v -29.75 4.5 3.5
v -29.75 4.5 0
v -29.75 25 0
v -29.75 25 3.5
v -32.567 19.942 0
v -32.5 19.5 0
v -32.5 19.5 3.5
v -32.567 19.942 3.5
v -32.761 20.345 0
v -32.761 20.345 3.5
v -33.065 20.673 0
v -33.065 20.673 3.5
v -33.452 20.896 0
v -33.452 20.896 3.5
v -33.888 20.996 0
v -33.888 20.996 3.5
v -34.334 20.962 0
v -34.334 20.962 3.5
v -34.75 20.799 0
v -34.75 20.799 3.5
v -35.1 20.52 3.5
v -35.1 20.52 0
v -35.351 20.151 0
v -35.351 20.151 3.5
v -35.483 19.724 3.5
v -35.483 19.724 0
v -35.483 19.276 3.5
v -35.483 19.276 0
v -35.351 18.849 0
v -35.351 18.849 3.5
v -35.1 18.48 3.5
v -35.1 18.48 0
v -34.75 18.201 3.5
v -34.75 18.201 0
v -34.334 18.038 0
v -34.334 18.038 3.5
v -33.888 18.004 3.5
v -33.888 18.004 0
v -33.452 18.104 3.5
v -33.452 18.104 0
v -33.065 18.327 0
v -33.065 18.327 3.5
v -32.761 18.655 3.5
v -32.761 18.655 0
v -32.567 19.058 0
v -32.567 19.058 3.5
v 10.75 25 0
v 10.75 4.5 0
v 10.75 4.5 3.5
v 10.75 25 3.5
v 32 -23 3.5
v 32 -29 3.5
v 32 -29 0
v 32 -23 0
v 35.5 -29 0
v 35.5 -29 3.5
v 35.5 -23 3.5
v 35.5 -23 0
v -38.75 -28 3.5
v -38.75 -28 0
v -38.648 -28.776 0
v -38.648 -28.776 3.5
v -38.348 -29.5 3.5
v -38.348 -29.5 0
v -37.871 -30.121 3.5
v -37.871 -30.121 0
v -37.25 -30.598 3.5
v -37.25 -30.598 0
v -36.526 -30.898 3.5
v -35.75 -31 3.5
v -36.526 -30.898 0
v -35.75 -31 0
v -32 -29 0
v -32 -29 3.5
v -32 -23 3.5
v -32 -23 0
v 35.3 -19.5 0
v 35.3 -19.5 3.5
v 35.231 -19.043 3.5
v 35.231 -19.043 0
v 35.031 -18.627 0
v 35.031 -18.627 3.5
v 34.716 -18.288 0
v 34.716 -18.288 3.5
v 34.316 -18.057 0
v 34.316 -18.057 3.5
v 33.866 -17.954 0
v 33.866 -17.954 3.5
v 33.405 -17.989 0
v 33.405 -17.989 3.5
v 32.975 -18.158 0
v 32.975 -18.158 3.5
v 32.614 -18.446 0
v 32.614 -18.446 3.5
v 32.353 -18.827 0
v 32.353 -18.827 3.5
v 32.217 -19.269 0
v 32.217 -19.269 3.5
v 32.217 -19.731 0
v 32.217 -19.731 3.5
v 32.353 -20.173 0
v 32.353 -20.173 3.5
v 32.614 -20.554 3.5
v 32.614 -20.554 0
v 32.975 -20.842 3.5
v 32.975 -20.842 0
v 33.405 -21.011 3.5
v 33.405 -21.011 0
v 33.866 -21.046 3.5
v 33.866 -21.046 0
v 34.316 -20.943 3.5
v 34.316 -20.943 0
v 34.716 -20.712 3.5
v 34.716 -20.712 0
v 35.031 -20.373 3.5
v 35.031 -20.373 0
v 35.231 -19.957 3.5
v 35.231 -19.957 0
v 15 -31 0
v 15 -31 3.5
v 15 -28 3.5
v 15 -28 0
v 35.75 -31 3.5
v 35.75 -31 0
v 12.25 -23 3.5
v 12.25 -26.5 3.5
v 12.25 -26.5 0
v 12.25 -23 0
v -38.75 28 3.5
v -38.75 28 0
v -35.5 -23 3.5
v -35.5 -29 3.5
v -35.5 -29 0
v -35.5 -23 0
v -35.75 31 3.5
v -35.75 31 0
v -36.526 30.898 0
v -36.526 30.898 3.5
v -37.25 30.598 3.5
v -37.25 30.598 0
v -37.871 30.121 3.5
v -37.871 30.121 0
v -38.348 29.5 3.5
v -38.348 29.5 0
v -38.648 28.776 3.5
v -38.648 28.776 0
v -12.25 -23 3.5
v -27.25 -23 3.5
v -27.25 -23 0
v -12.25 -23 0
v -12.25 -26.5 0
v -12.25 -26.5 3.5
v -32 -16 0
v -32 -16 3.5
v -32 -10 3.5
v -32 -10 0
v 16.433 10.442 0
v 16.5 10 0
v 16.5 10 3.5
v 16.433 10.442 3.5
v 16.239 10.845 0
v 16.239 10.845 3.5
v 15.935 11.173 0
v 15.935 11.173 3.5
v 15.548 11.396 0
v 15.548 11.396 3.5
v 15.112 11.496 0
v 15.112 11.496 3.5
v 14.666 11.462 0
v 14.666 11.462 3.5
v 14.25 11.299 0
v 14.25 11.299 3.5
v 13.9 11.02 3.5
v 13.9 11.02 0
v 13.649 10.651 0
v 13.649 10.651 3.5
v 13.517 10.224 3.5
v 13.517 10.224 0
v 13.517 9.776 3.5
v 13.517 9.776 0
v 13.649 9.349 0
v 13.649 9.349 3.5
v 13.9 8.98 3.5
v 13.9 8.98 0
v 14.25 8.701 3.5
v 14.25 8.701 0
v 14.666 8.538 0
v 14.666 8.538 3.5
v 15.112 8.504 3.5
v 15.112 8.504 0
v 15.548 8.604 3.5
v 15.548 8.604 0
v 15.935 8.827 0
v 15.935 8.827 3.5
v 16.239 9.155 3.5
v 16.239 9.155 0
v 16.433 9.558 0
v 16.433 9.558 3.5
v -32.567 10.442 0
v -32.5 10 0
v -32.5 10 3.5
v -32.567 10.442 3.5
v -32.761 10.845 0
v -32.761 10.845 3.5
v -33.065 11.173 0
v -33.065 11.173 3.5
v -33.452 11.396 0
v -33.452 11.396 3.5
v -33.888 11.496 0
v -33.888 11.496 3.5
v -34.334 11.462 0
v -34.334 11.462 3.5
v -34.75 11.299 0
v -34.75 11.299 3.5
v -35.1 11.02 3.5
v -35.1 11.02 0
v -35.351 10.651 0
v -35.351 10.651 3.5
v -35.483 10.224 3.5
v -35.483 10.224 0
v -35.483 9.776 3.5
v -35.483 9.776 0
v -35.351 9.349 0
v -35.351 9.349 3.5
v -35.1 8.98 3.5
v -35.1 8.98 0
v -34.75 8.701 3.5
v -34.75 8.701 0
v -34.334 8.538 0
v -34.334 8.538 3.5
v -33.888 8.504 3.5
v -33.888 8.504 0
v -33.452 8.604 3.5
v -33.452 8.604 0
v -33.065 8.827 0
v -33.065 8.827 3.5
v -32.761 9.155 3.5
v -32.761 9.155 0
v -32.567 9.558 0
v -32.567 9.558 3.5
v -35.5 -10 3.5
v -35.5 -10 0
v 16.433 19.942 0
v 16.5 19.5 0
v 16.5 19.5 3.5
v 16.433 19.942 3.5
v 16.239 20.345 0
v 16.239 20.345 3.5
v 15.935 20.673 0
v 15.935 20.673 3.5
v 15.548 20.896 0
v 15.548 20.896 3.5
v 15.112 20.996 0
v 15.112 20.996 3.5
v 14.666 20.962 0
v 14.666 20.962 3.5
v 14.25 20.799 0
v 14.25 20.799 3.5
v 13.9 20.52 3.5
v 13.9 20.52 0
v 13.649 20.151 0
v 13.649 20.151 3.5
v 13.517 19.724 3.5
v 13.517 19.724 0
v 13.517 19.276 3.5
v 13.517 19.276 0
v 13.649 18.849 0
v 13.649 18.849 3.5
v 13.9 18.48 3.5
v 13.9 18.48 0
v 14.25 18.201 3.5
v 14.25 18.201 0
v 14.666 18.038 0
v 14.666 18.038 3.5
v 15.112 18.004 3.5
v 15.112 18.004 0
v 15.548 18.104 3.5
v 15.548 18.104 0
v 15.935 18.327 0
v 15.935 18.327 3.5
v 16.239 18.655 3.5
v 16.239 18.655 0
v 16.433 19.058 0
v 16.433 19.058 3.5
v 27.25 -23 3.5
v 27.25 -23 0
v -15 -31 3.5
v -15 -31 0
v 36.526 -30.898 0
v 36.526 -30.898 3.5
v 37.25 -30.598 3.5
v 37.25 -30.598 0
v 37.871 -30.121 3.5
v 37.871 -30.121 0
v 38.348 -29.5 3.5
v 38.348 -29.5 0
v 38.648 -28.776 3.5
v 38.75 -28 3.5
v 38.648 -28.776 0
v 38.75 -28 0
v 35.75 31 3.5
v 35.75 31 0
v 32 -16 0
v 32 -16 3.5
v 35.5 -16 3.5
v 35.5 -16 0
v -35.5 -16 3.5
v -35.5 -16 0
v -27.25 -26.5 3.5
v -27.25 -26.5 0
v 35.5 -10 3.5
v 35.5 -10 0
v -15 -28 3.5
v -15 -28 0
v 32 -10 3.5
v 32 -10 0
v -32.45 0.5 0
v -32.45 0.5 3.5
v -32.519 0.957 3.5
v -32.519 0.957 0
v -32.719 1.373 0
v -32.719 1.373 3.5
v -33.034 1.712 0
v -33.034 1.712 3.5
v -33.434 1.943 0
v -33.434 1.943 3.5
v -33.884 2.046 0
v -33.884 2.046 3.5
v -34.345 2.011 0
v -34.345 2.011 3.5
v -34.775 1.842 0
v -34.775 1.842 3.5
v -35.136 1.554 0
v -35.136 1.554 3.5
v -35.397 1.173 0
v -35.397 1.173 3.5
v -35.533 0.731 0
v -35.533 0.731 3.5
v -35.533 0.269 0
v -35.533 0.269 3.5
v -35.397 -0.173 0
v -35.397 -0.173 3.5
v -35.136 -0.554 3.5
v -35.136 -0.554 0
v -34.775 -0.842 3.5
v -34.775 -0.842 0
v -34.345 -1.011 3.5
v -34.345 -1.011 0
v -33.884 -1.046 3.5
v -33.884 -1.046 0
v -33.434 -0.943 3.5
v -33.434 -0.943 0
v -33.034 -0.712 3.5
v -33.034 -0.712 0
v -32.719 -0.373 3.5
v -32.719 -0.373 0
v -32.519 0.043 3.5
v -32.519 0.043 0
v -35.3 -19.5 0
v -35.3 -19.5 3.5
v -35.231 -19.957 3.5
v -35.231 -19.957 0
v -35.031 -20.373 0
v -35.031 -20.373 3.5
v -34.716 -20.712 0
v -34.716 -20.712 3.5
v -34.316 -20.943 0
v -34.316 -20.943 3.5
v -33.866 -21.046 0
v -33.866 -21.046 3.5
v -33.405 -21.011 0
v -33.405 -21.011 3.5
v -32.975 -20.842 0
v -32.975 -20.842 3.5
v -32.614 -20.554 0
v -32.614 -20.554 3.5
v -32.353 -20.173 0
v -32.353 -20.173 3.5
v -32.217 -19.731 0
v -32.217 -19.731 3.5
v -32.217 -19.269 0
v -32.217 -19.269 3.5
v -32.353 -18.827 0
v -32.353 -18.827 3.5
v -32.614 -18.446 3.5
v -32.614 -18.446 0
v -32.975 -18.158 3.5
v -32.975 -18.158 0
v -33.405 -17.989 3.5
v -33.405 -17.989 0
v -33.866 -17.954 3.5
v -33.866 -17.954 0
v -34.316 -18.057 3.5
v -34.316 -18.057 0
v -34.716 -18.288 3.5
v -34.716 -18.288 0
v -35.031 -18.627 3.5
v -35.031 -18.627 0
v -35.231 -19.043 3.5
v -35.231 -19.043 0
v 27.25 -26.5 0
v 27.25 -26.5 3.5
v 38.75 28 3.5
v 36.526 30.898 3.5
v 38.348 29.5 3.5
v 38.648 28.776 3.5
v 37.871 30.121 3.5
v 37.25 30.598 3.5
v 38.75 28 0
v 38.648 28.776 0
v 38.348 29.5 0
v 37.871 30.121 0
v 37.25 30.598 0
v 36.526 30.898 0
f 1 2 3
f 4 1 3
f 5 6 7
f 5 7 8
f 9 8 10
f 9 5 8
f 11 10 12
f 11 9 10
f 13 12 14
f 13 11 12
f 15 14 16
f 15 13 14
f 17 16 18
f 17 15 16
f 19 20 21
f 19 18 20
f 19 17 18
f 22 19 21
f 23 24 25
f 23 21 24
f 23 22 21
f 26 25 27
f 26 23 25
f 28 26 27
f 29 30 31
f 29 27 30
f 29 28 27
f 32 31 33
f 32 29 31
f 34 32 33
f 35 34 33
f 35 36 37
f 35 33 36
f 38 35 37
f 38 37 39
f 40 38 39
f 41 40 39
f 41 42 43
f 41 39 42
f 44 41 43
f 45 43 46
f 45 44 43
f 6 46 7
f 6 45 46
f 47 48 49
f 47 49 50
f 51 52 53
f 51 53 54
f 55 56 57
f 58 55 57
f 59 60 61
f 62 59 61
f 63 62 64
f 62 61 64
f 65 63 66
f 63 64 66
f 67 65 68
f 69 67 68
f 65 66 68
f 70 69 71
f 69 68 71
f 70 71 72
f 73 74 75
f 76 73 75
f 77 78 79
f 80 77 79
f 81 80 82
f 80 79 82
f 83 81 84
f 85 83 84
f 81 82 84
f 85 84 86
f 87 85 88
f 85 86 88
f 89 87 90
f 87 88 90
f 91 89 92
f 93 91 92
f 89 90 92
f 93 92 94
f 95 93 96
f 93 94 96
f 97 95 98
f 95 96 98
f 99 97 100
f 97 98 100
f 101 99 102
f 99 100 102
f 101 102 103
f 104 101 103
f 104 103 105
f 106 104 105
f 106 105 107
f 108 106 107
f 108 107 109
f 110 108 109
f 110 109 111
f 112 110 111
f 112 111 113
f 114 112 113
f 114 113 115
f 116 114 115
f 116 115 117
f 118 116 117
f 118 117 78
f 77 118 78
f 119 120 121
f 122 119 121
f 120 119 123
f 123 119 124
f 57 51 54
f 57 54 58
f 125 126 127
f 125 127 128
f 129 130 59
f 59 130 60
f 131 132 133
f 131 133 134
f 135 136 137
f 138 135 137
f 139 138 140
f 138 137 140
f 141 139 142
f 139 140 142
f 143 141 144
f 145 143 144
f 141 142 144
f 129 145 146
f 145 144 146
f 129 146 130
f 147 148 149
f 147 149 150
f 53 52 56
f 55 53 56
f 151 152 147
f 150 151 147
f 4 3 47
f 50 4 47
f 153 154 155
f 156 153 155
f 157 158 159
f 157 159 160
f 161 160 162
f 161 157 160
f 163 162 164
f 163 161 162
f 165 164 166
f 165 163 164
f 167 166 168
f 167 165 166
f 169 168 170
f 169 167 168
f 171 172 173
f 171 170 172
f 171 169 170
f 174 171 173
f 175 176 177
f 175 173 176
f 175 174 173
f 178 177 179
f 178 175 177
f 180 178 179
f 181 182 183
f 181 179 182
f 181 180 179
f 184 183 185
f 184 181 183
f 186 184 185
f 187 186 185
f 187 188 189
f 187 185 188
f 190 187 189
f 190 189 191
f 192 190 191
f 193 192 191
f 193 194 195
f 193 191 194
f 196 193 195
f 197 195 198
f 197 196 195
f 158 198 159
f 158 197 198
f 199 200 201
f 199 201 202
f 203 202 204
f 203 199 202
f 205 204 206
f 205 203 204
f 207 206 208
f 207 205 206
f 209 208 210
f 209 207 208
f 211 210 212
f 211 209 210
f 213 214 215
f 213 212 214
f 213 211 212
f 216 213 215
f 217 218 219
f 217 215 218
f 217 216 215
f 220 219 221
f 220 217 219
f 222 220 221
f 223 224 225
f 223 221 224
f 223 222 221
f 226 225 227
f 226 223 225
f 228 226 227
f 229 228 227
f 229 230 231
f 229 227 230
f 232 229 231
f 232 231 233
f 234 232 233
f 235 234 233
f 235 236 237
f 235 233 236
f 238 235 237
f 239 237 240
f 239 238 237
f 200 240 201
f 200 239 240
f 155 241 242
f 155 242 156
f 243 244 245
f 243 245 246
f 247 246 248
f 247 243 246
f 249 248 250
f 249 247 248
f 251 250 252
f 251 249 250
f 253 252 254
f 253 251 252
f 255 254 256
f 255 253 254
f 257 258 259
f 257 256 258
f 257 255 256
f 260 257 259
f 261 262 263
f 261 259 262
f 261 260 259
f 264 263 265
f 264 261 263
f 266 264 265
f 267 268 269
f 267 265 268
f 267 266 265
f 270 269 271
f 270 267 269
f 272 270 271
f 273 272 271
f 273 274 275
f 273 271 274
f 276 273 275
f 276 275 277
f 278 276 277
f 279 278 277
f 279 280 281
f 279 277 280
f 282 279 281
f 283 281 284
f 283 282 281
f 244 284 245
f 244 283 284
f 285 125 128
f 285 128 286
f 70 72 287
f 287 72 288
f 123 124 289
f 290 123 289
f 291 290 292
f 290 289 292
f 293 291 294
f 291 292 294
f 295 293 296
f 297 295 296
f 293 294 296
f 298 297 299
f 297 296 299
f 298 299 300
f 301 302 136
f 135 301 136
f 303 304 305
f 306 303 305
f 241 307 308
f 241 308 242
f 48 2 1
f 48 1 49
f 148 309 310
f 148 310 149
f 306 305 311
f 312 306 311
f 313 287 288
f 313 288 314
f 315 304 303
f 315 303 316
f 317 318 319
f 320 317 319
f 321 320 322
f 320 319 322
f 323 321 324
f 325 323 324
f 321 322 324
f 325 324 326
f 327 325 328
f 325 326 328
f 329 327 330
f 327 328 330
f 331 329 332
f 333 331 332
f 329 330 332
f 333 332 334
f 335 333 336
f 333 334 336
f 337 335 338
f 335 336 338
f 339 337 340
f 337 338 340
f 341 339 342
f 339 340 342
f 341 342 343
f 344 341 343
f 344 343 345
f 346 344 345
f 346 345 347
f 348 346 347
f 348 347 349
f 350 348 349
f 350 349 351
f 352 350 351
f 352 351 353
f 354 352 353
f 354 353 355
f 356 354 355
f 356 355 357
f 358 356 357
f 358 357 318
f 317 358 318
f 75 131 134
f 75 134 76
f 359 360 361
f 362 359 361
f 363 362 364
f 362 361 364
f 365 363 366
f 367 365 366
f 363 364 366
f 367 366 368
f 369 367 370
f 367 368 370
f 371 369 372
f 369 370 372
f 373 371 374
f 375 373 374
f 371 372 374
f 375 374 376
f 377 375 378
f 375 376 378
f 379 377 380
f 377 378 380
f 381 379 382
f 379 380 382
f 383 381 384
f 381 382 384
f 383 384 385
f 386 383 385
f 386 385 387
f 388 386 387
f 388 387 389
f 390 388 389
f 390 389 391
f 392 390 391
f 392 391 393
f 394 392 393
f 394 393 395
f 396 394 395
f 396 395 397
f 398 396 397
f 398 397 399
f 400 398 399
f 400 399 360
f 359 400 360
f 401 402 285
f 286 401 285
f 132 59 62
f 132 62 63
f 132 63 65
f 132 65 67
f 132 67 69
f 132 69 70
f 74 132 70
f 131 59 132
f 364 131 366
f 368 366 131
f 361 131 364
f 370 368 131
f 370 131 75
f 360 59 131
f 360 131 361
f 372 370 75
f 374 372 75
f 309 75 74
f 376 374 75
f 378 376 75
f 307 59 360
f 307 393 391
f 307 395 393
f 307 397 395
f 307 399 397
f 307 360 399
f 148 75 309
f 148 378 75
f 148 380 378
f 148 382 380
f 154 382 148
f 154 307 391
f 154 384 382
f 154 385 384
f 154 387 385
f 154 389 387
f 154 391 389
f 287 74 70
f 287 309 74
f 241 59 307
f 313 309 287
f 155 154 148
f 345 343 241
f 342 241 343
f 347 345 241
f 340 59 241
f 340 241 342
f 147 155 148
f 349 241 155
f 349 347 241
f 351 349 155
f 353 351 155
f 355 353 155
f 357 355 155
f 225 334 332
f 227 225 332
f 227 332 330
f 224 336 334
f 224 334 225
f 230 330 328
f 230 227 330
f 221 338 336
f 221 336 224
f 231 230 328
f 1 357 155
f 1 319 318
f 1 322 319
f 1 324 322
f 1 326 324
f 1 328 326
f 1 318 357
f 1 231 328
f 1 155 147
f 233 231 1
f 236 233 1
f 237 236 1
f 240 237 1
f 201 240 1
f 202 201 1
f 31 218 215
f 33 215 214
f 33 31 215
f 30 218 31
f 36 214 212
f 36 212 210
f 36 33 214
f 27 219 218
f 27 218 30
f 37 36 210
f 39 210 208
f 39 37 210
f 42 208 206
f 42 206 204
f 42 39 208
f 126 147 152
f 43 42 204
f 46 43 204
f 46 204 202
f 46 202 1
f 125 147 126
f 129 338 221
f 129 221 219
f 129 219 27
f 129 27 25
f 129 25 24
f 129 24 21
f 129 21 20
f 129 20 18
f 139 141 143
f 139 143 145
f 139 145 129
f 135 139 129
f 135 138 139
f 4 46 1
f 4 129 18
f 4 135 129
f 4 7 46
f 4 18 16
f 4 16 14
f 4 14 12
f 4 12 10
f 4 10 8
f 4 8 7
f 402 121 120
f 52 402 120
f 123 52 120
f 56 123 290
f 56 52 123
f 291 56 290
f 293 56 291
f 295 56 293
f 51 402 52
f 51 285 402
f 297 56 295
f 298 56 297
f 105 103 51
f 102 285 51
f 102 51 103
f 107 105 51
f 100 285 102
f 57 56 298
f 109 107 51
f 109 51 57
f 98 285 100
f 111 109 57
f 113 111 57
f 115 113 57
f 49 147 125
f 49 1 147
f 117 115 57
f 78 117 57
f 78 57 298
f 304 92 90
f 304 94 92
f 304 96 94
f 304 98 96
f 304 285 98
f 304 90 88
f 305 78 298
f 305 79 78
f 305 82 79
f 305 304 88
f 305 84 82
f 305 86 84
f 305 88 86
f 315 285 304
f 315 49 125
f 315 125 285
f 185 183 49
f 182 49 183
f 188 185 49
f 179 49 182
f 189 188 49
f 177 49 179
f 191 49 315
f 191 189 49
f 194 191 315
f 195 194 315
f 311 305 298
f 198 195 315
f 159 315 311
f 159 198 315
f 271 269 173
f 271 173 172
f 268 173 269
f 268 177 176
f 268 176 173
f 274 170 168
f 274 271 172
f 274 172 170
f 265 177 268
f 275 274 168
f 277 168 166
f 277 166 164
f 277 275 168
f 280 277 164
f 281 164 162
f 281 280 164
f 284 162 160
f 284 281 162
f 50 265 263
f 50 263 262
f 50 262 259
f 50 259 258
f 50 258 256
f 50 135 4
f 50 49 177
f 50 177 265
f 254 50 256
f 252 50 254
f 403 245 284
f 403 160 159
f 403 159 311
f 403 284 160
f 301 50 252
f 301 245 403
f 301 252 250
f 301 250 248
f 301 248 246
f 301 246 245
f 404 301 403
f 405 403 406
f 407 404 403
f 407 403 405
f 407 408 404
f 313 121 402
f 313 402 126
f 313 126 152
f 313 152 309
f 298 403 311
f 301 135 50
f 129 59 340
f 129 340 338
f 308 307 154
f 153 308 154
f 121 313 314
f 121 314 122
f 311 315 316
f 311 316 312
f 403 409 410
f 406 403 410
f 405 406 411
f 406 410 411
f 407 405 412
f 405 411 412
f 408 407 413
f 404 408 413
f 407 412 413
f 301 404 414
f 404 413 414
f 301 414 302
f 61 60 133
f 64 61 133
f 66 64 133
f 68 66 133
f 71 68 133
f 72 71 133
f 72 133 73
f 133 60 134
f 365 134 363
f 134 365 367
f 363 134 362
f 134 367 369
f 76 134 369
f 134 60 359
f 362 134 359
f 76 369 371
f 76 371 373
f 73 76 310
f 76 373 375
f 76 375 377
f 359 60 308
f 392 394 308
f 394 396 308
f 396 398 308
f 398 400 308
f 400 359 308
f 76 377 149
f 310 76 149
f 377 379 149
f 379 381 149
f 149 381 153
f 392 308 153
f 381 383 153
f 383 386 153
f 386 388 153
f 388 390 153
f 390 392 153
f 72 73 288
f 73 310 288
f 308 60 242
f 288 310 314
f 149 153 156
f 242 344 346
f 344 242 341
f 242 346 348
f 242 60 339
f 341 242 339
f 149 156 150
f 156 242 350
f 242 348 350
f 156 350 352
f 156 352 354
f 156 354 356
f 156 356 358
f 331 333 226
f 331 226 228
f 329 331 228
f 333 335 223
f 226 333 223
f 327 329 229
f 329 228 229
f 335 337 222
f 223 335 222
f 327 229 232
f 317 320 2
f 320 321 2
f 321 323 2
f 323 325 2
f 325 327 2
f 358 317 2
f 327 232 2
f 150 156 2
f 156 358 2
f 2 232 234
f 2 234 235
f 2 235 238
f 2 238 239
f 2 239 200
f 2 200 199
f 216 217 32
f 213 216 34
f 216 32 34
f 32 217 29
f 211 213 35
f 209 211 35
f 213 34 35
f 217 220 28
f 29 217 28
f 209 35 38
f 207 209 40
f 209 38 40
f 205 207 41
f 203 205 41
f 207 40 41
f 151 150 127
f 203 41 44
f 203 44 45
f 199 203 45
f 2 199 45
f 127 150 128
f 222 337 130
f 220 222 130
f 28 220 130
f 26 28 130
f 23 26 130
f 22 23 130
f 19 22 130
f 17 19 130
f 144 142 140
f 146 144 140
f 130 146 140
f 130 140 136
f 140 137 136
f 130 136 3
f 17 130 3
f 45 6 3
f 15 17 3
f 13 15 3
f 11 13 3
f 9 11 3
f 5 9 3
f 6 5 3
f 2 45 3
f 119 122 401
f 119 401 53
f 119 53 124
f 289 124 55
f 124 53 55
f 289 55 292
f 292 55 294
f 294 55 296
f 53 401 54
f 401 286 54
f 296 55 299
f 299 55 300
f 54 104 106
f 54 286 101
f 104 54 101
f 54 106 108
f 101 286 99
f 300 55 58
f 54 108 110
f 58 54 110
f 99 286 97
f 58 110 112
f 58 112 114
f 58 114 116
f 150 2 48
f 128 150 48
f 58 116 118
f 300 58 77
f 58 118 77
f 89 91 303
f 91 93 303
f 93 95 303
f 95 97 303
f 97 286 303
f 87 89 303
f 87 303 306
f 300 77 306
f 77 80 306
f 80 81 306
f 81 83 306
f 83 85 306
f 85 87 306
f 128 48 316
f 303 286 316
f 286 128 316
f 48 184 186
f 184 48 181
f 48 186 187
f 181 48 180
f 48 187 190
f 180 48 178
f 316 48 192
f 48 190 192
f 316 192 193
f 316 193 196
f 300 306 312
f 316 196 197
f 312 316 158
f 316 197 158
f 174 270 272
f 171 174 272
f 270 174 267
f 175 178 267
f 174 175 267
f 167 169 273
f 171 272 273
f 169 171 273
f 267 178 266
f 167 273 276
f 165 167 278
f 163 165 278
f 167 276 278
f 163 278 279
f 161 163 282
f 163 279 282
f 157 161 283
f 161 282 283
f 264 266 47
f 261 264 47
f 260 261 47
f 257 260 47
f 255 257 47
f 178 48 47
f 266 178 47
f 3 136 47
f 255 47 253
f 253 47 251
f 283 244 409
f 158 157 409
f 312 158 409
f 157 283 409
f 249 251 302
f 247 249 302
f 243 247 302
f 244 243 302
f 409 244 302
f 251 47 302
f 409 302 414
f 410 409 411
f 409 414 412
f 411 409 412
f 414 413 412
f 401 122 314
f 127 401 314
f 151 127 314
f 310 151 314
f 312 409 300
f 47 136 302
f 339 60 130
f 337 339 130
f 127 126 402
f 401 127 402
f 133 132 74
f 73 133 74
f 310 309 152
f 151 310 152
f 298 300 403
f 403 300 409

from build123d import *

# Parameters (mm, degrees)
SKETCH1_W               = 40.5
SKETCH1_H               = 20.5
BOSS_EXTRUDE1_DEPTH     = 3.5
SKETCH2_R               = 1.55
SKETCH2_W               = 3.5
SKETCH2_H               = 6
CUT_EXTRUDE1_DEPTH      = 50.747487374
SKETCH3_W               = 15
SKETCH3_H               = 3.5
CUT_EXTRUDE2_DEPTH      = 50.747487374
CUT_EXTRUDE3_DEPTH      = 50.747487374
CUT_EXTRUDE3_DEPTH_BACK = 50.747487374
SKETCH4_R               = 1.5
CUT_EXTRUDE4_REACH      = 51.747
SKETCH5_R               = 1.55
SKETCH6_W               = 30
SKETCH6_H               = 3
CUT_EXTRUDE5_DEPTH      = 10


with BuildPart() as part:
    # Sketch1 → Boss-Extrude1 (new body)
    with BuildSketch(Plane.XY):
        with BuildLine():
            Line((-35.75, -31), (35.75, -31))
            ThreePointArc((35.75, -31), (37.871320344, -30.121320344), (38.75, -28))
            Line((38.75, -28), (38.75, 28))
            ThreePointArc((38.75, 28), (37.871320344, 30.121320344), (35.75, 31))
            Line((35.75, 31), (-35.75, 31))
            ThreePointArc((-35.75, 31), (-37.871320344, 30.121320344), (-38.75, 28))
            Line((-38.75, 28), (-38.75, -28))
            ThreePointArc((-38.75, -28), (-37.871320344, -30.121320344), (-35.75, -31))
        make_face()
        with Locations((-9.5, 14.75)):
            Rectangle(SKETCH1_W, SKETCH1_H, mode=Mode.SUBTRACT)
    extrude(amount=BOSS_EXTRUDE1_DEPTH)

    # Sketch2 → Cut-Extrude1 (cut, through all)
    with BuildSketch(Plane.XY.offset(3.5)):
        with Locations((33.75, -19.5)):
            Circle(SKETCH2_R)
        with Locations(Location((-33.75, -19.5, 0), (0, 0, 180))):
            Circle(SKETCH2_R)
        with Locations((33.75, -13)):
            Rectangle(SKETCH2_W, SKETCH2_H)
        with Locations((33.75, -26)):
            Rectangle(SKETCH2_W, SKETCH2_H)
        with Locations((-33.75, -26)):
            Rectangle(SKETCH2_W, SKETCH2_H)
        with Locations((-33.75, -13)):
            Rectangle(SKETCH2_W, SKETCH2_H)
    extrude(amount=-CUT_EXTRUDE1_DEPTH, mode=Mode.SUBTRACT)

    # Sketch3 → Cut-Extrude2 (cut, through all)
    with BuildSketch(Plane.XY.offset(3.5)):
        with Locations((-19.75, -24.75)):
            Rectangle(SKETCH3_W, SKETCH3_H)
        with Locations((19.75, -24.75)):
            Rectangle(SKETCH3_W, SKETCH3_H)
    extrude(amount=-CUT_EXTRUDE2_DEPTH, mode=Mode.SUBTRACT)

    # Sketch4 → Cut-Extrude3 (cut, two sides: drawn at the far end of the back side and taken through both)
    with BuildSketch(Plane.XY.offset(3.5).offset(-CUT_EXTRUDE3_DEPTH_BACK)):
        with Locations((15, 19.5)):
            Circle(SKETCH4_R)
        with Locations((15, 10)):
            Circle(SKETCH4_R)
        with Locations((-34, 10)):
            Circle(SKETCH4_R)
        with Locations((-34, 19.5)):
            Circle(SKETCH4_R)
    extrude(amount=CUT_EXTRUDE3_DEPTH + CUT_EXTRUDE3_DEPTH_BACK, mode=Mode.SUBTRACT)

    # Sketch5 → Cut-Extrude4 (cut, up to next)
    with BuildSketch(Plane.XY.offset(3.5), mode=Mode.PRIVATE) as cut_extrude4_sk1:
        with Locations((-34, 0.5)):
            Circle(SKETCH5_R)
    cut_extrude4_tool1 = extrude(cut_extrude4_sk1.sketch, amount=-CUT_EXTRUDE4_REACH, mode=Mode.PRIVATE) & part.part
    add(cut_extrude4_tool1.solids().sort_by_distance((-34, 0.5, 3.5))[0], mode=Mode.SUBTRACT)

    # Sketch6 → Cut-Extrude5 (cut)
    with BuildSketch(Plane.XY.offset(3.5)):
        with Locations((0, -29.5)):
            Rectangle(SKETCH6_W, SKETCH6_H)
    extrude(amount=-CUT_EXTRUDE5_DEPTH, mode=Mode.SUBTRACT)


solid = part.part
